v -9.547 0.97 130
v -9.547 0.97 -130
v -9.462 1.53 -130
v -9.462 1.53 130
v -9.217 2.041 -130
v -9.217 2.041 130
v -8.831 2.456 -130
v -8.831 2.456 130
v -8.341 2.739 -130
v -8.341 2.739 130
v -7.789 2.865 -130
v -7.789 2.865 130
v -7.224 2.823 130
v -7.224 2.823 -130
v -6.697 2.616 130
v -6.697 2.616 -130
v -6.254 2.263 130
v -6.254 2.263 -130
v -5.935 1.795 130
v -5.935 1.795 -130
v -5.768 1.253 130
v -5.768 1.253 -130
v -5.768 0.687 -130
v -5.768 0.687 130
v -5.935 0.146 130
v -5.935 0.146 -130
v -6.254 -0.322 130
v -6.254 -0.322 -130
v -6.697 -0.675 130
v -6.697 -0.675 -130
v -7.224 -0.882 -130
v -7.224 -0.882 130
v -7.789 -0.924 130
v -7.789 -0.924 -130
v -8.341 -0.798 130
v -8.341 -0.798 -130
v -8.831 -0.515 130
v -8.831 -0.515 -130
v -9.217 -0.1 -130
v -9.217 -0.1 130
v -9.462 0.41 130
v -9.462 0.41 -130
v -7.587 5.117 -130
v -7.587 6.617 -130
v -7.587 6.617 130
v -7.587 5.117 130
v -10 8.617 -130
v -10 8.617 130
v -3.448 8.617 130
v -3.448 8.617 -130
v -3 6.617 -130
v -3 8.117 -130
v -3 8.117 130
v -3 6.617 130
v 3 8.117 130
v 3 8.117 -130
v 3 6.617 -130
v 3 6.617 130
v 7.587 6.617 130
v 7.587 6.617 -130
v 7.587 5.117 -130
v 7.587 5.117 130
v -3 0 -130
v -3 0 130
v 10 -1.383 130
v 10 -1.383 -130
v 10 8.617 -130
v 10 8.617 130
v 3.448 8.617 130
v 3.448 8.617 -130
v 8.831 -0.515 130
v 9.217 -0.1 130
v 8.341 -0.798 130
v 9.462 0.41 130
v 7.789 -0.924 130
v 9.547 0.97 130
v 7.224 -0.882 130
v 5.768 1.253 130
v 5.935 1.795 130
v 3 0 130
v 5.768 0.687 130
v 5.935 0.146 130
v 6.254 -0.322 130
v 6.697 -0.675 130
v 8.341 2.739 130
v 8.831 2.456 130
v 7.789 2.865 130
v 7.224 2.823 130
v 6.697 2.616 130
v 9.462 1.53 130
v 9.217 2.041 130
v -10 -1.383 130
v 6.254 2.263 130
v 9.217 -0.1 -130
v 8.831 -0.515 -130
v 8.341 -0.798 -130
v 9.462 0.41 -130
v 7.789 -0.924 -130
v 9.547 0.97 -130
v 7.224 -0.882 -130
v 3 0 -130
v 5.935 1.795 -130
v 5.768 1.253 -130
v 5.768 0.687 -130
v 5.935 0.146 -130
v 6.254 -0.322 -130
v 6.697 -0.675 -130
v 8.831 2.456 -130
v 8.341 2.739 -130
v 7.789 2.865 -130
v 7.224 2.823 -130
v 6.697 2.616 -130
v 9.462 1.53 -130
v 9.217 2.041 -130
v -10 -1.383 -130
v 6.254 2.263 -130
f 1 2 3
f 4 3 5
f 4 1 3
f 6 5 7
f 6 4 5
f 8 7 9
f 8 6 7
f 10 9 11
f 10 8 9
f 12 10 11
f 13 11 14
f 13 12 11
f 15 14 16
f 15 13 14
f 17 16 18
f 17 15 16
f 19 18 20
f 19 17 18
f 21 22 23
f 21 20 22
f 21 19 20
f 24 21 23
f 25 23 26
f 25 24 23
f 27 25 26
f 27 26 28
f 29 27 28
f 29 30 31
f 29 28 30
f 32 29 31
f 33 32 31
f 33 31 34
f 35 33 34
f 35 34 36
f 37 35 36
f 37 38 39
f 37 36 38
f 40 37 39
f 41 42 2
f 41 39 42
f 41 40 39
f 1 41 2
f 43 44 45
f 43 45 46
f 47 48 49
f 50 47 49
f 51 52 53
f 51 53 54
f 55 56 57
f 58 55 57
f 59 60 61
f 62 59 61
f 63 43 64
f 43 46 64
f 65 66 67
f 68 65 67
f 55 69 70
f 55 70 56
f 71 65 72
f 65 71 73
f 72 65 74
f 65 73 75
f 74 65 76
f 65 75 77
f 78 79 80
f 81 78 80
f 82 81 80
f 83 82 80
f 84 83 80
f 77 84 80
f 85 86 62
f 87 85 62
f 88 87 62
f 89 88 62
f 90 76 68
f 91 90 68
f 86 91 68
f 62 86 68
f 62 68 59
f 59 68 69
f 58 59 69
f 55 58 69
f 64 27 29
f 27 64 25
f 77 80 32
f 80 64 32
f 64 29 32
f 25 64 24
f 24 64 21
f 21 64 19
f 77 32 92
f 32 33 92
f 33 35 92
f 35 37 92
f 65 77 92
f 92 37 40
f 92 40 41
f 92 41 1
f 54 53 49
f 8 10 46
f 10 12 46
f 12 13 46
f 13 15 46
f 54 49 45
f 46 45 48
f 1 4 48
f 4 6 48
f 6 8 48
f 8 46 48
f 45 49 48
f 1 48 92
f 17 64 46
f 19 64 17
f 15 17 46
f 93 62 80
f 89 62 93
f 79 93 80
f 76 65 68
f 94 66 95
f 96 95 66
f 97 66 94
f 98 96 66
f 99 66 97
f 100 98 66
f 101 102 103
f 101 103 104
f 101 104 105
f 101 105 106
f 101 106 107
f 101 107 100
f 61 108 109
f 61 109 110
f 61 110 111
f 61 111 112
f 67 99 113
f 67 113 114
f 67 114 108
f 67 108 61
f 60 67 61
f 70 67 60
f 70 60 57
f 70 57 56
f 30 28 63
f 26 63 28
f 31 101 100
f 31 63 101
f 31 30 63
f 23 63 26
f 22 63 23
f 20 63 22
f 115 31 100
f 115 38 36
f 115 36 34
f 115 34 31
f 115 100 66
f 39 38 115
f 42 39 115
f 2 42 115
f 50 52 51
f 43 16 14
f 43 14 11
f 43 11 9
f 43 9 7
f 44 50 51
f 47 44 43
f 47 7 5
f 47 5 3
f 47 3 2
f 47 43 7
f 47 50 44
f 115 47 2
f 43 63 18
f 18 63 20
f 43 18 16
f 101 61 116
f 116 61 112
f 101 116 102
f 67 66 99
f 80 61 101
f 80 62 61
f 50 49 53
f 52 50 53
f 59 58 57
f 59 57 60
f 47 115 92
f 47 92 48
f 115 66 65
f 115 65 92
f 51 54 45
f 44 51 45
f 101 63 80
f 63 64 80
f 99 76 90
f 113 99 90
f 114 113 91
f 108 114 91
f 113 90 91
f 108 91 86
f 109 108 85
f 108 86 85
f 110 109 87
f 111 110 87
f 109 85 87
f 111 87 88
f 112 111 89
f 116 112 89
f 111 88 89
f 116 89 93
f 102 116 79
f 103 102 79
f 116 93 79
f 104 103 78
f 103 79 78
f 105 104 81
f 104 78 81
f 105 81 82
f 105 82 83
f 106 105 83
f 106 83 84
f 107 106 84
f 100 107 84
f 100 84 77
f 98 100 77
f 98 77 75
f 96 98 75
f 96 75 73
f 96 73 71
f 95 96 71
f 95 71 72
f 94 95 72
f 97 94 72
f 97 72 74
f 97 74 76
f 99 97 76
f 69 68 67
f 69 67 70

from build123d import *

# Parameters (mm, degrees)
BOSS_EXTRUDE1_DEPTH = 130
SKETCH2_R           = 1.9
CUT_EXTRUDE1_DEPTH  = 261.334886359


with BuildPart() as part:
    # Sketch1 → Boss-Extrude1 (new, symmetric)
    with BuildSketch(Plane.XY):
        Polygon((0, 0), (0, -1.382978723), (10, -1.382978723), (10, 8.617021277), (3.448211747, 8.617021277), (3, 8.117021277), (3, 6.617021277), (7.587018089, 6.617021277), (7.587018089, 5.117021277), (3, 0), align=None)
    boss_extrude1 = extrude(amount=BOSS_EXTRUDE1_DEPTH, both=True)

    # Mirror1: Boss-Extrude1 across plane
    add(boss_extrude1.mirror(Plane(origin=(0, 0, 0), x_dir=(0, 0, 1), z_dir=(1, 0, 0))))

    # Sketch2 → Cut-Extrude1 (cut, through all)
    with BuildSketch(Plane.XY.offset(130)):
        with Locations((7.646716257, 0.97030502)):
            Circle(SKETCH2_R)
    cut_extrude1 = extrude(amount=-CUT_EXTRUDE1_DEPTH, mode=Mode.SUBTRACT)

    # Mirror2: Cut-Extrude1 across plane
    add(cut_extrude1.mirror(Plane(origin=(0, 0, 0), x_dir=(0, 0, 1), z_dir=(1, 0, 0))), mode=Mode.SUBTRACT)


solid = part.part
